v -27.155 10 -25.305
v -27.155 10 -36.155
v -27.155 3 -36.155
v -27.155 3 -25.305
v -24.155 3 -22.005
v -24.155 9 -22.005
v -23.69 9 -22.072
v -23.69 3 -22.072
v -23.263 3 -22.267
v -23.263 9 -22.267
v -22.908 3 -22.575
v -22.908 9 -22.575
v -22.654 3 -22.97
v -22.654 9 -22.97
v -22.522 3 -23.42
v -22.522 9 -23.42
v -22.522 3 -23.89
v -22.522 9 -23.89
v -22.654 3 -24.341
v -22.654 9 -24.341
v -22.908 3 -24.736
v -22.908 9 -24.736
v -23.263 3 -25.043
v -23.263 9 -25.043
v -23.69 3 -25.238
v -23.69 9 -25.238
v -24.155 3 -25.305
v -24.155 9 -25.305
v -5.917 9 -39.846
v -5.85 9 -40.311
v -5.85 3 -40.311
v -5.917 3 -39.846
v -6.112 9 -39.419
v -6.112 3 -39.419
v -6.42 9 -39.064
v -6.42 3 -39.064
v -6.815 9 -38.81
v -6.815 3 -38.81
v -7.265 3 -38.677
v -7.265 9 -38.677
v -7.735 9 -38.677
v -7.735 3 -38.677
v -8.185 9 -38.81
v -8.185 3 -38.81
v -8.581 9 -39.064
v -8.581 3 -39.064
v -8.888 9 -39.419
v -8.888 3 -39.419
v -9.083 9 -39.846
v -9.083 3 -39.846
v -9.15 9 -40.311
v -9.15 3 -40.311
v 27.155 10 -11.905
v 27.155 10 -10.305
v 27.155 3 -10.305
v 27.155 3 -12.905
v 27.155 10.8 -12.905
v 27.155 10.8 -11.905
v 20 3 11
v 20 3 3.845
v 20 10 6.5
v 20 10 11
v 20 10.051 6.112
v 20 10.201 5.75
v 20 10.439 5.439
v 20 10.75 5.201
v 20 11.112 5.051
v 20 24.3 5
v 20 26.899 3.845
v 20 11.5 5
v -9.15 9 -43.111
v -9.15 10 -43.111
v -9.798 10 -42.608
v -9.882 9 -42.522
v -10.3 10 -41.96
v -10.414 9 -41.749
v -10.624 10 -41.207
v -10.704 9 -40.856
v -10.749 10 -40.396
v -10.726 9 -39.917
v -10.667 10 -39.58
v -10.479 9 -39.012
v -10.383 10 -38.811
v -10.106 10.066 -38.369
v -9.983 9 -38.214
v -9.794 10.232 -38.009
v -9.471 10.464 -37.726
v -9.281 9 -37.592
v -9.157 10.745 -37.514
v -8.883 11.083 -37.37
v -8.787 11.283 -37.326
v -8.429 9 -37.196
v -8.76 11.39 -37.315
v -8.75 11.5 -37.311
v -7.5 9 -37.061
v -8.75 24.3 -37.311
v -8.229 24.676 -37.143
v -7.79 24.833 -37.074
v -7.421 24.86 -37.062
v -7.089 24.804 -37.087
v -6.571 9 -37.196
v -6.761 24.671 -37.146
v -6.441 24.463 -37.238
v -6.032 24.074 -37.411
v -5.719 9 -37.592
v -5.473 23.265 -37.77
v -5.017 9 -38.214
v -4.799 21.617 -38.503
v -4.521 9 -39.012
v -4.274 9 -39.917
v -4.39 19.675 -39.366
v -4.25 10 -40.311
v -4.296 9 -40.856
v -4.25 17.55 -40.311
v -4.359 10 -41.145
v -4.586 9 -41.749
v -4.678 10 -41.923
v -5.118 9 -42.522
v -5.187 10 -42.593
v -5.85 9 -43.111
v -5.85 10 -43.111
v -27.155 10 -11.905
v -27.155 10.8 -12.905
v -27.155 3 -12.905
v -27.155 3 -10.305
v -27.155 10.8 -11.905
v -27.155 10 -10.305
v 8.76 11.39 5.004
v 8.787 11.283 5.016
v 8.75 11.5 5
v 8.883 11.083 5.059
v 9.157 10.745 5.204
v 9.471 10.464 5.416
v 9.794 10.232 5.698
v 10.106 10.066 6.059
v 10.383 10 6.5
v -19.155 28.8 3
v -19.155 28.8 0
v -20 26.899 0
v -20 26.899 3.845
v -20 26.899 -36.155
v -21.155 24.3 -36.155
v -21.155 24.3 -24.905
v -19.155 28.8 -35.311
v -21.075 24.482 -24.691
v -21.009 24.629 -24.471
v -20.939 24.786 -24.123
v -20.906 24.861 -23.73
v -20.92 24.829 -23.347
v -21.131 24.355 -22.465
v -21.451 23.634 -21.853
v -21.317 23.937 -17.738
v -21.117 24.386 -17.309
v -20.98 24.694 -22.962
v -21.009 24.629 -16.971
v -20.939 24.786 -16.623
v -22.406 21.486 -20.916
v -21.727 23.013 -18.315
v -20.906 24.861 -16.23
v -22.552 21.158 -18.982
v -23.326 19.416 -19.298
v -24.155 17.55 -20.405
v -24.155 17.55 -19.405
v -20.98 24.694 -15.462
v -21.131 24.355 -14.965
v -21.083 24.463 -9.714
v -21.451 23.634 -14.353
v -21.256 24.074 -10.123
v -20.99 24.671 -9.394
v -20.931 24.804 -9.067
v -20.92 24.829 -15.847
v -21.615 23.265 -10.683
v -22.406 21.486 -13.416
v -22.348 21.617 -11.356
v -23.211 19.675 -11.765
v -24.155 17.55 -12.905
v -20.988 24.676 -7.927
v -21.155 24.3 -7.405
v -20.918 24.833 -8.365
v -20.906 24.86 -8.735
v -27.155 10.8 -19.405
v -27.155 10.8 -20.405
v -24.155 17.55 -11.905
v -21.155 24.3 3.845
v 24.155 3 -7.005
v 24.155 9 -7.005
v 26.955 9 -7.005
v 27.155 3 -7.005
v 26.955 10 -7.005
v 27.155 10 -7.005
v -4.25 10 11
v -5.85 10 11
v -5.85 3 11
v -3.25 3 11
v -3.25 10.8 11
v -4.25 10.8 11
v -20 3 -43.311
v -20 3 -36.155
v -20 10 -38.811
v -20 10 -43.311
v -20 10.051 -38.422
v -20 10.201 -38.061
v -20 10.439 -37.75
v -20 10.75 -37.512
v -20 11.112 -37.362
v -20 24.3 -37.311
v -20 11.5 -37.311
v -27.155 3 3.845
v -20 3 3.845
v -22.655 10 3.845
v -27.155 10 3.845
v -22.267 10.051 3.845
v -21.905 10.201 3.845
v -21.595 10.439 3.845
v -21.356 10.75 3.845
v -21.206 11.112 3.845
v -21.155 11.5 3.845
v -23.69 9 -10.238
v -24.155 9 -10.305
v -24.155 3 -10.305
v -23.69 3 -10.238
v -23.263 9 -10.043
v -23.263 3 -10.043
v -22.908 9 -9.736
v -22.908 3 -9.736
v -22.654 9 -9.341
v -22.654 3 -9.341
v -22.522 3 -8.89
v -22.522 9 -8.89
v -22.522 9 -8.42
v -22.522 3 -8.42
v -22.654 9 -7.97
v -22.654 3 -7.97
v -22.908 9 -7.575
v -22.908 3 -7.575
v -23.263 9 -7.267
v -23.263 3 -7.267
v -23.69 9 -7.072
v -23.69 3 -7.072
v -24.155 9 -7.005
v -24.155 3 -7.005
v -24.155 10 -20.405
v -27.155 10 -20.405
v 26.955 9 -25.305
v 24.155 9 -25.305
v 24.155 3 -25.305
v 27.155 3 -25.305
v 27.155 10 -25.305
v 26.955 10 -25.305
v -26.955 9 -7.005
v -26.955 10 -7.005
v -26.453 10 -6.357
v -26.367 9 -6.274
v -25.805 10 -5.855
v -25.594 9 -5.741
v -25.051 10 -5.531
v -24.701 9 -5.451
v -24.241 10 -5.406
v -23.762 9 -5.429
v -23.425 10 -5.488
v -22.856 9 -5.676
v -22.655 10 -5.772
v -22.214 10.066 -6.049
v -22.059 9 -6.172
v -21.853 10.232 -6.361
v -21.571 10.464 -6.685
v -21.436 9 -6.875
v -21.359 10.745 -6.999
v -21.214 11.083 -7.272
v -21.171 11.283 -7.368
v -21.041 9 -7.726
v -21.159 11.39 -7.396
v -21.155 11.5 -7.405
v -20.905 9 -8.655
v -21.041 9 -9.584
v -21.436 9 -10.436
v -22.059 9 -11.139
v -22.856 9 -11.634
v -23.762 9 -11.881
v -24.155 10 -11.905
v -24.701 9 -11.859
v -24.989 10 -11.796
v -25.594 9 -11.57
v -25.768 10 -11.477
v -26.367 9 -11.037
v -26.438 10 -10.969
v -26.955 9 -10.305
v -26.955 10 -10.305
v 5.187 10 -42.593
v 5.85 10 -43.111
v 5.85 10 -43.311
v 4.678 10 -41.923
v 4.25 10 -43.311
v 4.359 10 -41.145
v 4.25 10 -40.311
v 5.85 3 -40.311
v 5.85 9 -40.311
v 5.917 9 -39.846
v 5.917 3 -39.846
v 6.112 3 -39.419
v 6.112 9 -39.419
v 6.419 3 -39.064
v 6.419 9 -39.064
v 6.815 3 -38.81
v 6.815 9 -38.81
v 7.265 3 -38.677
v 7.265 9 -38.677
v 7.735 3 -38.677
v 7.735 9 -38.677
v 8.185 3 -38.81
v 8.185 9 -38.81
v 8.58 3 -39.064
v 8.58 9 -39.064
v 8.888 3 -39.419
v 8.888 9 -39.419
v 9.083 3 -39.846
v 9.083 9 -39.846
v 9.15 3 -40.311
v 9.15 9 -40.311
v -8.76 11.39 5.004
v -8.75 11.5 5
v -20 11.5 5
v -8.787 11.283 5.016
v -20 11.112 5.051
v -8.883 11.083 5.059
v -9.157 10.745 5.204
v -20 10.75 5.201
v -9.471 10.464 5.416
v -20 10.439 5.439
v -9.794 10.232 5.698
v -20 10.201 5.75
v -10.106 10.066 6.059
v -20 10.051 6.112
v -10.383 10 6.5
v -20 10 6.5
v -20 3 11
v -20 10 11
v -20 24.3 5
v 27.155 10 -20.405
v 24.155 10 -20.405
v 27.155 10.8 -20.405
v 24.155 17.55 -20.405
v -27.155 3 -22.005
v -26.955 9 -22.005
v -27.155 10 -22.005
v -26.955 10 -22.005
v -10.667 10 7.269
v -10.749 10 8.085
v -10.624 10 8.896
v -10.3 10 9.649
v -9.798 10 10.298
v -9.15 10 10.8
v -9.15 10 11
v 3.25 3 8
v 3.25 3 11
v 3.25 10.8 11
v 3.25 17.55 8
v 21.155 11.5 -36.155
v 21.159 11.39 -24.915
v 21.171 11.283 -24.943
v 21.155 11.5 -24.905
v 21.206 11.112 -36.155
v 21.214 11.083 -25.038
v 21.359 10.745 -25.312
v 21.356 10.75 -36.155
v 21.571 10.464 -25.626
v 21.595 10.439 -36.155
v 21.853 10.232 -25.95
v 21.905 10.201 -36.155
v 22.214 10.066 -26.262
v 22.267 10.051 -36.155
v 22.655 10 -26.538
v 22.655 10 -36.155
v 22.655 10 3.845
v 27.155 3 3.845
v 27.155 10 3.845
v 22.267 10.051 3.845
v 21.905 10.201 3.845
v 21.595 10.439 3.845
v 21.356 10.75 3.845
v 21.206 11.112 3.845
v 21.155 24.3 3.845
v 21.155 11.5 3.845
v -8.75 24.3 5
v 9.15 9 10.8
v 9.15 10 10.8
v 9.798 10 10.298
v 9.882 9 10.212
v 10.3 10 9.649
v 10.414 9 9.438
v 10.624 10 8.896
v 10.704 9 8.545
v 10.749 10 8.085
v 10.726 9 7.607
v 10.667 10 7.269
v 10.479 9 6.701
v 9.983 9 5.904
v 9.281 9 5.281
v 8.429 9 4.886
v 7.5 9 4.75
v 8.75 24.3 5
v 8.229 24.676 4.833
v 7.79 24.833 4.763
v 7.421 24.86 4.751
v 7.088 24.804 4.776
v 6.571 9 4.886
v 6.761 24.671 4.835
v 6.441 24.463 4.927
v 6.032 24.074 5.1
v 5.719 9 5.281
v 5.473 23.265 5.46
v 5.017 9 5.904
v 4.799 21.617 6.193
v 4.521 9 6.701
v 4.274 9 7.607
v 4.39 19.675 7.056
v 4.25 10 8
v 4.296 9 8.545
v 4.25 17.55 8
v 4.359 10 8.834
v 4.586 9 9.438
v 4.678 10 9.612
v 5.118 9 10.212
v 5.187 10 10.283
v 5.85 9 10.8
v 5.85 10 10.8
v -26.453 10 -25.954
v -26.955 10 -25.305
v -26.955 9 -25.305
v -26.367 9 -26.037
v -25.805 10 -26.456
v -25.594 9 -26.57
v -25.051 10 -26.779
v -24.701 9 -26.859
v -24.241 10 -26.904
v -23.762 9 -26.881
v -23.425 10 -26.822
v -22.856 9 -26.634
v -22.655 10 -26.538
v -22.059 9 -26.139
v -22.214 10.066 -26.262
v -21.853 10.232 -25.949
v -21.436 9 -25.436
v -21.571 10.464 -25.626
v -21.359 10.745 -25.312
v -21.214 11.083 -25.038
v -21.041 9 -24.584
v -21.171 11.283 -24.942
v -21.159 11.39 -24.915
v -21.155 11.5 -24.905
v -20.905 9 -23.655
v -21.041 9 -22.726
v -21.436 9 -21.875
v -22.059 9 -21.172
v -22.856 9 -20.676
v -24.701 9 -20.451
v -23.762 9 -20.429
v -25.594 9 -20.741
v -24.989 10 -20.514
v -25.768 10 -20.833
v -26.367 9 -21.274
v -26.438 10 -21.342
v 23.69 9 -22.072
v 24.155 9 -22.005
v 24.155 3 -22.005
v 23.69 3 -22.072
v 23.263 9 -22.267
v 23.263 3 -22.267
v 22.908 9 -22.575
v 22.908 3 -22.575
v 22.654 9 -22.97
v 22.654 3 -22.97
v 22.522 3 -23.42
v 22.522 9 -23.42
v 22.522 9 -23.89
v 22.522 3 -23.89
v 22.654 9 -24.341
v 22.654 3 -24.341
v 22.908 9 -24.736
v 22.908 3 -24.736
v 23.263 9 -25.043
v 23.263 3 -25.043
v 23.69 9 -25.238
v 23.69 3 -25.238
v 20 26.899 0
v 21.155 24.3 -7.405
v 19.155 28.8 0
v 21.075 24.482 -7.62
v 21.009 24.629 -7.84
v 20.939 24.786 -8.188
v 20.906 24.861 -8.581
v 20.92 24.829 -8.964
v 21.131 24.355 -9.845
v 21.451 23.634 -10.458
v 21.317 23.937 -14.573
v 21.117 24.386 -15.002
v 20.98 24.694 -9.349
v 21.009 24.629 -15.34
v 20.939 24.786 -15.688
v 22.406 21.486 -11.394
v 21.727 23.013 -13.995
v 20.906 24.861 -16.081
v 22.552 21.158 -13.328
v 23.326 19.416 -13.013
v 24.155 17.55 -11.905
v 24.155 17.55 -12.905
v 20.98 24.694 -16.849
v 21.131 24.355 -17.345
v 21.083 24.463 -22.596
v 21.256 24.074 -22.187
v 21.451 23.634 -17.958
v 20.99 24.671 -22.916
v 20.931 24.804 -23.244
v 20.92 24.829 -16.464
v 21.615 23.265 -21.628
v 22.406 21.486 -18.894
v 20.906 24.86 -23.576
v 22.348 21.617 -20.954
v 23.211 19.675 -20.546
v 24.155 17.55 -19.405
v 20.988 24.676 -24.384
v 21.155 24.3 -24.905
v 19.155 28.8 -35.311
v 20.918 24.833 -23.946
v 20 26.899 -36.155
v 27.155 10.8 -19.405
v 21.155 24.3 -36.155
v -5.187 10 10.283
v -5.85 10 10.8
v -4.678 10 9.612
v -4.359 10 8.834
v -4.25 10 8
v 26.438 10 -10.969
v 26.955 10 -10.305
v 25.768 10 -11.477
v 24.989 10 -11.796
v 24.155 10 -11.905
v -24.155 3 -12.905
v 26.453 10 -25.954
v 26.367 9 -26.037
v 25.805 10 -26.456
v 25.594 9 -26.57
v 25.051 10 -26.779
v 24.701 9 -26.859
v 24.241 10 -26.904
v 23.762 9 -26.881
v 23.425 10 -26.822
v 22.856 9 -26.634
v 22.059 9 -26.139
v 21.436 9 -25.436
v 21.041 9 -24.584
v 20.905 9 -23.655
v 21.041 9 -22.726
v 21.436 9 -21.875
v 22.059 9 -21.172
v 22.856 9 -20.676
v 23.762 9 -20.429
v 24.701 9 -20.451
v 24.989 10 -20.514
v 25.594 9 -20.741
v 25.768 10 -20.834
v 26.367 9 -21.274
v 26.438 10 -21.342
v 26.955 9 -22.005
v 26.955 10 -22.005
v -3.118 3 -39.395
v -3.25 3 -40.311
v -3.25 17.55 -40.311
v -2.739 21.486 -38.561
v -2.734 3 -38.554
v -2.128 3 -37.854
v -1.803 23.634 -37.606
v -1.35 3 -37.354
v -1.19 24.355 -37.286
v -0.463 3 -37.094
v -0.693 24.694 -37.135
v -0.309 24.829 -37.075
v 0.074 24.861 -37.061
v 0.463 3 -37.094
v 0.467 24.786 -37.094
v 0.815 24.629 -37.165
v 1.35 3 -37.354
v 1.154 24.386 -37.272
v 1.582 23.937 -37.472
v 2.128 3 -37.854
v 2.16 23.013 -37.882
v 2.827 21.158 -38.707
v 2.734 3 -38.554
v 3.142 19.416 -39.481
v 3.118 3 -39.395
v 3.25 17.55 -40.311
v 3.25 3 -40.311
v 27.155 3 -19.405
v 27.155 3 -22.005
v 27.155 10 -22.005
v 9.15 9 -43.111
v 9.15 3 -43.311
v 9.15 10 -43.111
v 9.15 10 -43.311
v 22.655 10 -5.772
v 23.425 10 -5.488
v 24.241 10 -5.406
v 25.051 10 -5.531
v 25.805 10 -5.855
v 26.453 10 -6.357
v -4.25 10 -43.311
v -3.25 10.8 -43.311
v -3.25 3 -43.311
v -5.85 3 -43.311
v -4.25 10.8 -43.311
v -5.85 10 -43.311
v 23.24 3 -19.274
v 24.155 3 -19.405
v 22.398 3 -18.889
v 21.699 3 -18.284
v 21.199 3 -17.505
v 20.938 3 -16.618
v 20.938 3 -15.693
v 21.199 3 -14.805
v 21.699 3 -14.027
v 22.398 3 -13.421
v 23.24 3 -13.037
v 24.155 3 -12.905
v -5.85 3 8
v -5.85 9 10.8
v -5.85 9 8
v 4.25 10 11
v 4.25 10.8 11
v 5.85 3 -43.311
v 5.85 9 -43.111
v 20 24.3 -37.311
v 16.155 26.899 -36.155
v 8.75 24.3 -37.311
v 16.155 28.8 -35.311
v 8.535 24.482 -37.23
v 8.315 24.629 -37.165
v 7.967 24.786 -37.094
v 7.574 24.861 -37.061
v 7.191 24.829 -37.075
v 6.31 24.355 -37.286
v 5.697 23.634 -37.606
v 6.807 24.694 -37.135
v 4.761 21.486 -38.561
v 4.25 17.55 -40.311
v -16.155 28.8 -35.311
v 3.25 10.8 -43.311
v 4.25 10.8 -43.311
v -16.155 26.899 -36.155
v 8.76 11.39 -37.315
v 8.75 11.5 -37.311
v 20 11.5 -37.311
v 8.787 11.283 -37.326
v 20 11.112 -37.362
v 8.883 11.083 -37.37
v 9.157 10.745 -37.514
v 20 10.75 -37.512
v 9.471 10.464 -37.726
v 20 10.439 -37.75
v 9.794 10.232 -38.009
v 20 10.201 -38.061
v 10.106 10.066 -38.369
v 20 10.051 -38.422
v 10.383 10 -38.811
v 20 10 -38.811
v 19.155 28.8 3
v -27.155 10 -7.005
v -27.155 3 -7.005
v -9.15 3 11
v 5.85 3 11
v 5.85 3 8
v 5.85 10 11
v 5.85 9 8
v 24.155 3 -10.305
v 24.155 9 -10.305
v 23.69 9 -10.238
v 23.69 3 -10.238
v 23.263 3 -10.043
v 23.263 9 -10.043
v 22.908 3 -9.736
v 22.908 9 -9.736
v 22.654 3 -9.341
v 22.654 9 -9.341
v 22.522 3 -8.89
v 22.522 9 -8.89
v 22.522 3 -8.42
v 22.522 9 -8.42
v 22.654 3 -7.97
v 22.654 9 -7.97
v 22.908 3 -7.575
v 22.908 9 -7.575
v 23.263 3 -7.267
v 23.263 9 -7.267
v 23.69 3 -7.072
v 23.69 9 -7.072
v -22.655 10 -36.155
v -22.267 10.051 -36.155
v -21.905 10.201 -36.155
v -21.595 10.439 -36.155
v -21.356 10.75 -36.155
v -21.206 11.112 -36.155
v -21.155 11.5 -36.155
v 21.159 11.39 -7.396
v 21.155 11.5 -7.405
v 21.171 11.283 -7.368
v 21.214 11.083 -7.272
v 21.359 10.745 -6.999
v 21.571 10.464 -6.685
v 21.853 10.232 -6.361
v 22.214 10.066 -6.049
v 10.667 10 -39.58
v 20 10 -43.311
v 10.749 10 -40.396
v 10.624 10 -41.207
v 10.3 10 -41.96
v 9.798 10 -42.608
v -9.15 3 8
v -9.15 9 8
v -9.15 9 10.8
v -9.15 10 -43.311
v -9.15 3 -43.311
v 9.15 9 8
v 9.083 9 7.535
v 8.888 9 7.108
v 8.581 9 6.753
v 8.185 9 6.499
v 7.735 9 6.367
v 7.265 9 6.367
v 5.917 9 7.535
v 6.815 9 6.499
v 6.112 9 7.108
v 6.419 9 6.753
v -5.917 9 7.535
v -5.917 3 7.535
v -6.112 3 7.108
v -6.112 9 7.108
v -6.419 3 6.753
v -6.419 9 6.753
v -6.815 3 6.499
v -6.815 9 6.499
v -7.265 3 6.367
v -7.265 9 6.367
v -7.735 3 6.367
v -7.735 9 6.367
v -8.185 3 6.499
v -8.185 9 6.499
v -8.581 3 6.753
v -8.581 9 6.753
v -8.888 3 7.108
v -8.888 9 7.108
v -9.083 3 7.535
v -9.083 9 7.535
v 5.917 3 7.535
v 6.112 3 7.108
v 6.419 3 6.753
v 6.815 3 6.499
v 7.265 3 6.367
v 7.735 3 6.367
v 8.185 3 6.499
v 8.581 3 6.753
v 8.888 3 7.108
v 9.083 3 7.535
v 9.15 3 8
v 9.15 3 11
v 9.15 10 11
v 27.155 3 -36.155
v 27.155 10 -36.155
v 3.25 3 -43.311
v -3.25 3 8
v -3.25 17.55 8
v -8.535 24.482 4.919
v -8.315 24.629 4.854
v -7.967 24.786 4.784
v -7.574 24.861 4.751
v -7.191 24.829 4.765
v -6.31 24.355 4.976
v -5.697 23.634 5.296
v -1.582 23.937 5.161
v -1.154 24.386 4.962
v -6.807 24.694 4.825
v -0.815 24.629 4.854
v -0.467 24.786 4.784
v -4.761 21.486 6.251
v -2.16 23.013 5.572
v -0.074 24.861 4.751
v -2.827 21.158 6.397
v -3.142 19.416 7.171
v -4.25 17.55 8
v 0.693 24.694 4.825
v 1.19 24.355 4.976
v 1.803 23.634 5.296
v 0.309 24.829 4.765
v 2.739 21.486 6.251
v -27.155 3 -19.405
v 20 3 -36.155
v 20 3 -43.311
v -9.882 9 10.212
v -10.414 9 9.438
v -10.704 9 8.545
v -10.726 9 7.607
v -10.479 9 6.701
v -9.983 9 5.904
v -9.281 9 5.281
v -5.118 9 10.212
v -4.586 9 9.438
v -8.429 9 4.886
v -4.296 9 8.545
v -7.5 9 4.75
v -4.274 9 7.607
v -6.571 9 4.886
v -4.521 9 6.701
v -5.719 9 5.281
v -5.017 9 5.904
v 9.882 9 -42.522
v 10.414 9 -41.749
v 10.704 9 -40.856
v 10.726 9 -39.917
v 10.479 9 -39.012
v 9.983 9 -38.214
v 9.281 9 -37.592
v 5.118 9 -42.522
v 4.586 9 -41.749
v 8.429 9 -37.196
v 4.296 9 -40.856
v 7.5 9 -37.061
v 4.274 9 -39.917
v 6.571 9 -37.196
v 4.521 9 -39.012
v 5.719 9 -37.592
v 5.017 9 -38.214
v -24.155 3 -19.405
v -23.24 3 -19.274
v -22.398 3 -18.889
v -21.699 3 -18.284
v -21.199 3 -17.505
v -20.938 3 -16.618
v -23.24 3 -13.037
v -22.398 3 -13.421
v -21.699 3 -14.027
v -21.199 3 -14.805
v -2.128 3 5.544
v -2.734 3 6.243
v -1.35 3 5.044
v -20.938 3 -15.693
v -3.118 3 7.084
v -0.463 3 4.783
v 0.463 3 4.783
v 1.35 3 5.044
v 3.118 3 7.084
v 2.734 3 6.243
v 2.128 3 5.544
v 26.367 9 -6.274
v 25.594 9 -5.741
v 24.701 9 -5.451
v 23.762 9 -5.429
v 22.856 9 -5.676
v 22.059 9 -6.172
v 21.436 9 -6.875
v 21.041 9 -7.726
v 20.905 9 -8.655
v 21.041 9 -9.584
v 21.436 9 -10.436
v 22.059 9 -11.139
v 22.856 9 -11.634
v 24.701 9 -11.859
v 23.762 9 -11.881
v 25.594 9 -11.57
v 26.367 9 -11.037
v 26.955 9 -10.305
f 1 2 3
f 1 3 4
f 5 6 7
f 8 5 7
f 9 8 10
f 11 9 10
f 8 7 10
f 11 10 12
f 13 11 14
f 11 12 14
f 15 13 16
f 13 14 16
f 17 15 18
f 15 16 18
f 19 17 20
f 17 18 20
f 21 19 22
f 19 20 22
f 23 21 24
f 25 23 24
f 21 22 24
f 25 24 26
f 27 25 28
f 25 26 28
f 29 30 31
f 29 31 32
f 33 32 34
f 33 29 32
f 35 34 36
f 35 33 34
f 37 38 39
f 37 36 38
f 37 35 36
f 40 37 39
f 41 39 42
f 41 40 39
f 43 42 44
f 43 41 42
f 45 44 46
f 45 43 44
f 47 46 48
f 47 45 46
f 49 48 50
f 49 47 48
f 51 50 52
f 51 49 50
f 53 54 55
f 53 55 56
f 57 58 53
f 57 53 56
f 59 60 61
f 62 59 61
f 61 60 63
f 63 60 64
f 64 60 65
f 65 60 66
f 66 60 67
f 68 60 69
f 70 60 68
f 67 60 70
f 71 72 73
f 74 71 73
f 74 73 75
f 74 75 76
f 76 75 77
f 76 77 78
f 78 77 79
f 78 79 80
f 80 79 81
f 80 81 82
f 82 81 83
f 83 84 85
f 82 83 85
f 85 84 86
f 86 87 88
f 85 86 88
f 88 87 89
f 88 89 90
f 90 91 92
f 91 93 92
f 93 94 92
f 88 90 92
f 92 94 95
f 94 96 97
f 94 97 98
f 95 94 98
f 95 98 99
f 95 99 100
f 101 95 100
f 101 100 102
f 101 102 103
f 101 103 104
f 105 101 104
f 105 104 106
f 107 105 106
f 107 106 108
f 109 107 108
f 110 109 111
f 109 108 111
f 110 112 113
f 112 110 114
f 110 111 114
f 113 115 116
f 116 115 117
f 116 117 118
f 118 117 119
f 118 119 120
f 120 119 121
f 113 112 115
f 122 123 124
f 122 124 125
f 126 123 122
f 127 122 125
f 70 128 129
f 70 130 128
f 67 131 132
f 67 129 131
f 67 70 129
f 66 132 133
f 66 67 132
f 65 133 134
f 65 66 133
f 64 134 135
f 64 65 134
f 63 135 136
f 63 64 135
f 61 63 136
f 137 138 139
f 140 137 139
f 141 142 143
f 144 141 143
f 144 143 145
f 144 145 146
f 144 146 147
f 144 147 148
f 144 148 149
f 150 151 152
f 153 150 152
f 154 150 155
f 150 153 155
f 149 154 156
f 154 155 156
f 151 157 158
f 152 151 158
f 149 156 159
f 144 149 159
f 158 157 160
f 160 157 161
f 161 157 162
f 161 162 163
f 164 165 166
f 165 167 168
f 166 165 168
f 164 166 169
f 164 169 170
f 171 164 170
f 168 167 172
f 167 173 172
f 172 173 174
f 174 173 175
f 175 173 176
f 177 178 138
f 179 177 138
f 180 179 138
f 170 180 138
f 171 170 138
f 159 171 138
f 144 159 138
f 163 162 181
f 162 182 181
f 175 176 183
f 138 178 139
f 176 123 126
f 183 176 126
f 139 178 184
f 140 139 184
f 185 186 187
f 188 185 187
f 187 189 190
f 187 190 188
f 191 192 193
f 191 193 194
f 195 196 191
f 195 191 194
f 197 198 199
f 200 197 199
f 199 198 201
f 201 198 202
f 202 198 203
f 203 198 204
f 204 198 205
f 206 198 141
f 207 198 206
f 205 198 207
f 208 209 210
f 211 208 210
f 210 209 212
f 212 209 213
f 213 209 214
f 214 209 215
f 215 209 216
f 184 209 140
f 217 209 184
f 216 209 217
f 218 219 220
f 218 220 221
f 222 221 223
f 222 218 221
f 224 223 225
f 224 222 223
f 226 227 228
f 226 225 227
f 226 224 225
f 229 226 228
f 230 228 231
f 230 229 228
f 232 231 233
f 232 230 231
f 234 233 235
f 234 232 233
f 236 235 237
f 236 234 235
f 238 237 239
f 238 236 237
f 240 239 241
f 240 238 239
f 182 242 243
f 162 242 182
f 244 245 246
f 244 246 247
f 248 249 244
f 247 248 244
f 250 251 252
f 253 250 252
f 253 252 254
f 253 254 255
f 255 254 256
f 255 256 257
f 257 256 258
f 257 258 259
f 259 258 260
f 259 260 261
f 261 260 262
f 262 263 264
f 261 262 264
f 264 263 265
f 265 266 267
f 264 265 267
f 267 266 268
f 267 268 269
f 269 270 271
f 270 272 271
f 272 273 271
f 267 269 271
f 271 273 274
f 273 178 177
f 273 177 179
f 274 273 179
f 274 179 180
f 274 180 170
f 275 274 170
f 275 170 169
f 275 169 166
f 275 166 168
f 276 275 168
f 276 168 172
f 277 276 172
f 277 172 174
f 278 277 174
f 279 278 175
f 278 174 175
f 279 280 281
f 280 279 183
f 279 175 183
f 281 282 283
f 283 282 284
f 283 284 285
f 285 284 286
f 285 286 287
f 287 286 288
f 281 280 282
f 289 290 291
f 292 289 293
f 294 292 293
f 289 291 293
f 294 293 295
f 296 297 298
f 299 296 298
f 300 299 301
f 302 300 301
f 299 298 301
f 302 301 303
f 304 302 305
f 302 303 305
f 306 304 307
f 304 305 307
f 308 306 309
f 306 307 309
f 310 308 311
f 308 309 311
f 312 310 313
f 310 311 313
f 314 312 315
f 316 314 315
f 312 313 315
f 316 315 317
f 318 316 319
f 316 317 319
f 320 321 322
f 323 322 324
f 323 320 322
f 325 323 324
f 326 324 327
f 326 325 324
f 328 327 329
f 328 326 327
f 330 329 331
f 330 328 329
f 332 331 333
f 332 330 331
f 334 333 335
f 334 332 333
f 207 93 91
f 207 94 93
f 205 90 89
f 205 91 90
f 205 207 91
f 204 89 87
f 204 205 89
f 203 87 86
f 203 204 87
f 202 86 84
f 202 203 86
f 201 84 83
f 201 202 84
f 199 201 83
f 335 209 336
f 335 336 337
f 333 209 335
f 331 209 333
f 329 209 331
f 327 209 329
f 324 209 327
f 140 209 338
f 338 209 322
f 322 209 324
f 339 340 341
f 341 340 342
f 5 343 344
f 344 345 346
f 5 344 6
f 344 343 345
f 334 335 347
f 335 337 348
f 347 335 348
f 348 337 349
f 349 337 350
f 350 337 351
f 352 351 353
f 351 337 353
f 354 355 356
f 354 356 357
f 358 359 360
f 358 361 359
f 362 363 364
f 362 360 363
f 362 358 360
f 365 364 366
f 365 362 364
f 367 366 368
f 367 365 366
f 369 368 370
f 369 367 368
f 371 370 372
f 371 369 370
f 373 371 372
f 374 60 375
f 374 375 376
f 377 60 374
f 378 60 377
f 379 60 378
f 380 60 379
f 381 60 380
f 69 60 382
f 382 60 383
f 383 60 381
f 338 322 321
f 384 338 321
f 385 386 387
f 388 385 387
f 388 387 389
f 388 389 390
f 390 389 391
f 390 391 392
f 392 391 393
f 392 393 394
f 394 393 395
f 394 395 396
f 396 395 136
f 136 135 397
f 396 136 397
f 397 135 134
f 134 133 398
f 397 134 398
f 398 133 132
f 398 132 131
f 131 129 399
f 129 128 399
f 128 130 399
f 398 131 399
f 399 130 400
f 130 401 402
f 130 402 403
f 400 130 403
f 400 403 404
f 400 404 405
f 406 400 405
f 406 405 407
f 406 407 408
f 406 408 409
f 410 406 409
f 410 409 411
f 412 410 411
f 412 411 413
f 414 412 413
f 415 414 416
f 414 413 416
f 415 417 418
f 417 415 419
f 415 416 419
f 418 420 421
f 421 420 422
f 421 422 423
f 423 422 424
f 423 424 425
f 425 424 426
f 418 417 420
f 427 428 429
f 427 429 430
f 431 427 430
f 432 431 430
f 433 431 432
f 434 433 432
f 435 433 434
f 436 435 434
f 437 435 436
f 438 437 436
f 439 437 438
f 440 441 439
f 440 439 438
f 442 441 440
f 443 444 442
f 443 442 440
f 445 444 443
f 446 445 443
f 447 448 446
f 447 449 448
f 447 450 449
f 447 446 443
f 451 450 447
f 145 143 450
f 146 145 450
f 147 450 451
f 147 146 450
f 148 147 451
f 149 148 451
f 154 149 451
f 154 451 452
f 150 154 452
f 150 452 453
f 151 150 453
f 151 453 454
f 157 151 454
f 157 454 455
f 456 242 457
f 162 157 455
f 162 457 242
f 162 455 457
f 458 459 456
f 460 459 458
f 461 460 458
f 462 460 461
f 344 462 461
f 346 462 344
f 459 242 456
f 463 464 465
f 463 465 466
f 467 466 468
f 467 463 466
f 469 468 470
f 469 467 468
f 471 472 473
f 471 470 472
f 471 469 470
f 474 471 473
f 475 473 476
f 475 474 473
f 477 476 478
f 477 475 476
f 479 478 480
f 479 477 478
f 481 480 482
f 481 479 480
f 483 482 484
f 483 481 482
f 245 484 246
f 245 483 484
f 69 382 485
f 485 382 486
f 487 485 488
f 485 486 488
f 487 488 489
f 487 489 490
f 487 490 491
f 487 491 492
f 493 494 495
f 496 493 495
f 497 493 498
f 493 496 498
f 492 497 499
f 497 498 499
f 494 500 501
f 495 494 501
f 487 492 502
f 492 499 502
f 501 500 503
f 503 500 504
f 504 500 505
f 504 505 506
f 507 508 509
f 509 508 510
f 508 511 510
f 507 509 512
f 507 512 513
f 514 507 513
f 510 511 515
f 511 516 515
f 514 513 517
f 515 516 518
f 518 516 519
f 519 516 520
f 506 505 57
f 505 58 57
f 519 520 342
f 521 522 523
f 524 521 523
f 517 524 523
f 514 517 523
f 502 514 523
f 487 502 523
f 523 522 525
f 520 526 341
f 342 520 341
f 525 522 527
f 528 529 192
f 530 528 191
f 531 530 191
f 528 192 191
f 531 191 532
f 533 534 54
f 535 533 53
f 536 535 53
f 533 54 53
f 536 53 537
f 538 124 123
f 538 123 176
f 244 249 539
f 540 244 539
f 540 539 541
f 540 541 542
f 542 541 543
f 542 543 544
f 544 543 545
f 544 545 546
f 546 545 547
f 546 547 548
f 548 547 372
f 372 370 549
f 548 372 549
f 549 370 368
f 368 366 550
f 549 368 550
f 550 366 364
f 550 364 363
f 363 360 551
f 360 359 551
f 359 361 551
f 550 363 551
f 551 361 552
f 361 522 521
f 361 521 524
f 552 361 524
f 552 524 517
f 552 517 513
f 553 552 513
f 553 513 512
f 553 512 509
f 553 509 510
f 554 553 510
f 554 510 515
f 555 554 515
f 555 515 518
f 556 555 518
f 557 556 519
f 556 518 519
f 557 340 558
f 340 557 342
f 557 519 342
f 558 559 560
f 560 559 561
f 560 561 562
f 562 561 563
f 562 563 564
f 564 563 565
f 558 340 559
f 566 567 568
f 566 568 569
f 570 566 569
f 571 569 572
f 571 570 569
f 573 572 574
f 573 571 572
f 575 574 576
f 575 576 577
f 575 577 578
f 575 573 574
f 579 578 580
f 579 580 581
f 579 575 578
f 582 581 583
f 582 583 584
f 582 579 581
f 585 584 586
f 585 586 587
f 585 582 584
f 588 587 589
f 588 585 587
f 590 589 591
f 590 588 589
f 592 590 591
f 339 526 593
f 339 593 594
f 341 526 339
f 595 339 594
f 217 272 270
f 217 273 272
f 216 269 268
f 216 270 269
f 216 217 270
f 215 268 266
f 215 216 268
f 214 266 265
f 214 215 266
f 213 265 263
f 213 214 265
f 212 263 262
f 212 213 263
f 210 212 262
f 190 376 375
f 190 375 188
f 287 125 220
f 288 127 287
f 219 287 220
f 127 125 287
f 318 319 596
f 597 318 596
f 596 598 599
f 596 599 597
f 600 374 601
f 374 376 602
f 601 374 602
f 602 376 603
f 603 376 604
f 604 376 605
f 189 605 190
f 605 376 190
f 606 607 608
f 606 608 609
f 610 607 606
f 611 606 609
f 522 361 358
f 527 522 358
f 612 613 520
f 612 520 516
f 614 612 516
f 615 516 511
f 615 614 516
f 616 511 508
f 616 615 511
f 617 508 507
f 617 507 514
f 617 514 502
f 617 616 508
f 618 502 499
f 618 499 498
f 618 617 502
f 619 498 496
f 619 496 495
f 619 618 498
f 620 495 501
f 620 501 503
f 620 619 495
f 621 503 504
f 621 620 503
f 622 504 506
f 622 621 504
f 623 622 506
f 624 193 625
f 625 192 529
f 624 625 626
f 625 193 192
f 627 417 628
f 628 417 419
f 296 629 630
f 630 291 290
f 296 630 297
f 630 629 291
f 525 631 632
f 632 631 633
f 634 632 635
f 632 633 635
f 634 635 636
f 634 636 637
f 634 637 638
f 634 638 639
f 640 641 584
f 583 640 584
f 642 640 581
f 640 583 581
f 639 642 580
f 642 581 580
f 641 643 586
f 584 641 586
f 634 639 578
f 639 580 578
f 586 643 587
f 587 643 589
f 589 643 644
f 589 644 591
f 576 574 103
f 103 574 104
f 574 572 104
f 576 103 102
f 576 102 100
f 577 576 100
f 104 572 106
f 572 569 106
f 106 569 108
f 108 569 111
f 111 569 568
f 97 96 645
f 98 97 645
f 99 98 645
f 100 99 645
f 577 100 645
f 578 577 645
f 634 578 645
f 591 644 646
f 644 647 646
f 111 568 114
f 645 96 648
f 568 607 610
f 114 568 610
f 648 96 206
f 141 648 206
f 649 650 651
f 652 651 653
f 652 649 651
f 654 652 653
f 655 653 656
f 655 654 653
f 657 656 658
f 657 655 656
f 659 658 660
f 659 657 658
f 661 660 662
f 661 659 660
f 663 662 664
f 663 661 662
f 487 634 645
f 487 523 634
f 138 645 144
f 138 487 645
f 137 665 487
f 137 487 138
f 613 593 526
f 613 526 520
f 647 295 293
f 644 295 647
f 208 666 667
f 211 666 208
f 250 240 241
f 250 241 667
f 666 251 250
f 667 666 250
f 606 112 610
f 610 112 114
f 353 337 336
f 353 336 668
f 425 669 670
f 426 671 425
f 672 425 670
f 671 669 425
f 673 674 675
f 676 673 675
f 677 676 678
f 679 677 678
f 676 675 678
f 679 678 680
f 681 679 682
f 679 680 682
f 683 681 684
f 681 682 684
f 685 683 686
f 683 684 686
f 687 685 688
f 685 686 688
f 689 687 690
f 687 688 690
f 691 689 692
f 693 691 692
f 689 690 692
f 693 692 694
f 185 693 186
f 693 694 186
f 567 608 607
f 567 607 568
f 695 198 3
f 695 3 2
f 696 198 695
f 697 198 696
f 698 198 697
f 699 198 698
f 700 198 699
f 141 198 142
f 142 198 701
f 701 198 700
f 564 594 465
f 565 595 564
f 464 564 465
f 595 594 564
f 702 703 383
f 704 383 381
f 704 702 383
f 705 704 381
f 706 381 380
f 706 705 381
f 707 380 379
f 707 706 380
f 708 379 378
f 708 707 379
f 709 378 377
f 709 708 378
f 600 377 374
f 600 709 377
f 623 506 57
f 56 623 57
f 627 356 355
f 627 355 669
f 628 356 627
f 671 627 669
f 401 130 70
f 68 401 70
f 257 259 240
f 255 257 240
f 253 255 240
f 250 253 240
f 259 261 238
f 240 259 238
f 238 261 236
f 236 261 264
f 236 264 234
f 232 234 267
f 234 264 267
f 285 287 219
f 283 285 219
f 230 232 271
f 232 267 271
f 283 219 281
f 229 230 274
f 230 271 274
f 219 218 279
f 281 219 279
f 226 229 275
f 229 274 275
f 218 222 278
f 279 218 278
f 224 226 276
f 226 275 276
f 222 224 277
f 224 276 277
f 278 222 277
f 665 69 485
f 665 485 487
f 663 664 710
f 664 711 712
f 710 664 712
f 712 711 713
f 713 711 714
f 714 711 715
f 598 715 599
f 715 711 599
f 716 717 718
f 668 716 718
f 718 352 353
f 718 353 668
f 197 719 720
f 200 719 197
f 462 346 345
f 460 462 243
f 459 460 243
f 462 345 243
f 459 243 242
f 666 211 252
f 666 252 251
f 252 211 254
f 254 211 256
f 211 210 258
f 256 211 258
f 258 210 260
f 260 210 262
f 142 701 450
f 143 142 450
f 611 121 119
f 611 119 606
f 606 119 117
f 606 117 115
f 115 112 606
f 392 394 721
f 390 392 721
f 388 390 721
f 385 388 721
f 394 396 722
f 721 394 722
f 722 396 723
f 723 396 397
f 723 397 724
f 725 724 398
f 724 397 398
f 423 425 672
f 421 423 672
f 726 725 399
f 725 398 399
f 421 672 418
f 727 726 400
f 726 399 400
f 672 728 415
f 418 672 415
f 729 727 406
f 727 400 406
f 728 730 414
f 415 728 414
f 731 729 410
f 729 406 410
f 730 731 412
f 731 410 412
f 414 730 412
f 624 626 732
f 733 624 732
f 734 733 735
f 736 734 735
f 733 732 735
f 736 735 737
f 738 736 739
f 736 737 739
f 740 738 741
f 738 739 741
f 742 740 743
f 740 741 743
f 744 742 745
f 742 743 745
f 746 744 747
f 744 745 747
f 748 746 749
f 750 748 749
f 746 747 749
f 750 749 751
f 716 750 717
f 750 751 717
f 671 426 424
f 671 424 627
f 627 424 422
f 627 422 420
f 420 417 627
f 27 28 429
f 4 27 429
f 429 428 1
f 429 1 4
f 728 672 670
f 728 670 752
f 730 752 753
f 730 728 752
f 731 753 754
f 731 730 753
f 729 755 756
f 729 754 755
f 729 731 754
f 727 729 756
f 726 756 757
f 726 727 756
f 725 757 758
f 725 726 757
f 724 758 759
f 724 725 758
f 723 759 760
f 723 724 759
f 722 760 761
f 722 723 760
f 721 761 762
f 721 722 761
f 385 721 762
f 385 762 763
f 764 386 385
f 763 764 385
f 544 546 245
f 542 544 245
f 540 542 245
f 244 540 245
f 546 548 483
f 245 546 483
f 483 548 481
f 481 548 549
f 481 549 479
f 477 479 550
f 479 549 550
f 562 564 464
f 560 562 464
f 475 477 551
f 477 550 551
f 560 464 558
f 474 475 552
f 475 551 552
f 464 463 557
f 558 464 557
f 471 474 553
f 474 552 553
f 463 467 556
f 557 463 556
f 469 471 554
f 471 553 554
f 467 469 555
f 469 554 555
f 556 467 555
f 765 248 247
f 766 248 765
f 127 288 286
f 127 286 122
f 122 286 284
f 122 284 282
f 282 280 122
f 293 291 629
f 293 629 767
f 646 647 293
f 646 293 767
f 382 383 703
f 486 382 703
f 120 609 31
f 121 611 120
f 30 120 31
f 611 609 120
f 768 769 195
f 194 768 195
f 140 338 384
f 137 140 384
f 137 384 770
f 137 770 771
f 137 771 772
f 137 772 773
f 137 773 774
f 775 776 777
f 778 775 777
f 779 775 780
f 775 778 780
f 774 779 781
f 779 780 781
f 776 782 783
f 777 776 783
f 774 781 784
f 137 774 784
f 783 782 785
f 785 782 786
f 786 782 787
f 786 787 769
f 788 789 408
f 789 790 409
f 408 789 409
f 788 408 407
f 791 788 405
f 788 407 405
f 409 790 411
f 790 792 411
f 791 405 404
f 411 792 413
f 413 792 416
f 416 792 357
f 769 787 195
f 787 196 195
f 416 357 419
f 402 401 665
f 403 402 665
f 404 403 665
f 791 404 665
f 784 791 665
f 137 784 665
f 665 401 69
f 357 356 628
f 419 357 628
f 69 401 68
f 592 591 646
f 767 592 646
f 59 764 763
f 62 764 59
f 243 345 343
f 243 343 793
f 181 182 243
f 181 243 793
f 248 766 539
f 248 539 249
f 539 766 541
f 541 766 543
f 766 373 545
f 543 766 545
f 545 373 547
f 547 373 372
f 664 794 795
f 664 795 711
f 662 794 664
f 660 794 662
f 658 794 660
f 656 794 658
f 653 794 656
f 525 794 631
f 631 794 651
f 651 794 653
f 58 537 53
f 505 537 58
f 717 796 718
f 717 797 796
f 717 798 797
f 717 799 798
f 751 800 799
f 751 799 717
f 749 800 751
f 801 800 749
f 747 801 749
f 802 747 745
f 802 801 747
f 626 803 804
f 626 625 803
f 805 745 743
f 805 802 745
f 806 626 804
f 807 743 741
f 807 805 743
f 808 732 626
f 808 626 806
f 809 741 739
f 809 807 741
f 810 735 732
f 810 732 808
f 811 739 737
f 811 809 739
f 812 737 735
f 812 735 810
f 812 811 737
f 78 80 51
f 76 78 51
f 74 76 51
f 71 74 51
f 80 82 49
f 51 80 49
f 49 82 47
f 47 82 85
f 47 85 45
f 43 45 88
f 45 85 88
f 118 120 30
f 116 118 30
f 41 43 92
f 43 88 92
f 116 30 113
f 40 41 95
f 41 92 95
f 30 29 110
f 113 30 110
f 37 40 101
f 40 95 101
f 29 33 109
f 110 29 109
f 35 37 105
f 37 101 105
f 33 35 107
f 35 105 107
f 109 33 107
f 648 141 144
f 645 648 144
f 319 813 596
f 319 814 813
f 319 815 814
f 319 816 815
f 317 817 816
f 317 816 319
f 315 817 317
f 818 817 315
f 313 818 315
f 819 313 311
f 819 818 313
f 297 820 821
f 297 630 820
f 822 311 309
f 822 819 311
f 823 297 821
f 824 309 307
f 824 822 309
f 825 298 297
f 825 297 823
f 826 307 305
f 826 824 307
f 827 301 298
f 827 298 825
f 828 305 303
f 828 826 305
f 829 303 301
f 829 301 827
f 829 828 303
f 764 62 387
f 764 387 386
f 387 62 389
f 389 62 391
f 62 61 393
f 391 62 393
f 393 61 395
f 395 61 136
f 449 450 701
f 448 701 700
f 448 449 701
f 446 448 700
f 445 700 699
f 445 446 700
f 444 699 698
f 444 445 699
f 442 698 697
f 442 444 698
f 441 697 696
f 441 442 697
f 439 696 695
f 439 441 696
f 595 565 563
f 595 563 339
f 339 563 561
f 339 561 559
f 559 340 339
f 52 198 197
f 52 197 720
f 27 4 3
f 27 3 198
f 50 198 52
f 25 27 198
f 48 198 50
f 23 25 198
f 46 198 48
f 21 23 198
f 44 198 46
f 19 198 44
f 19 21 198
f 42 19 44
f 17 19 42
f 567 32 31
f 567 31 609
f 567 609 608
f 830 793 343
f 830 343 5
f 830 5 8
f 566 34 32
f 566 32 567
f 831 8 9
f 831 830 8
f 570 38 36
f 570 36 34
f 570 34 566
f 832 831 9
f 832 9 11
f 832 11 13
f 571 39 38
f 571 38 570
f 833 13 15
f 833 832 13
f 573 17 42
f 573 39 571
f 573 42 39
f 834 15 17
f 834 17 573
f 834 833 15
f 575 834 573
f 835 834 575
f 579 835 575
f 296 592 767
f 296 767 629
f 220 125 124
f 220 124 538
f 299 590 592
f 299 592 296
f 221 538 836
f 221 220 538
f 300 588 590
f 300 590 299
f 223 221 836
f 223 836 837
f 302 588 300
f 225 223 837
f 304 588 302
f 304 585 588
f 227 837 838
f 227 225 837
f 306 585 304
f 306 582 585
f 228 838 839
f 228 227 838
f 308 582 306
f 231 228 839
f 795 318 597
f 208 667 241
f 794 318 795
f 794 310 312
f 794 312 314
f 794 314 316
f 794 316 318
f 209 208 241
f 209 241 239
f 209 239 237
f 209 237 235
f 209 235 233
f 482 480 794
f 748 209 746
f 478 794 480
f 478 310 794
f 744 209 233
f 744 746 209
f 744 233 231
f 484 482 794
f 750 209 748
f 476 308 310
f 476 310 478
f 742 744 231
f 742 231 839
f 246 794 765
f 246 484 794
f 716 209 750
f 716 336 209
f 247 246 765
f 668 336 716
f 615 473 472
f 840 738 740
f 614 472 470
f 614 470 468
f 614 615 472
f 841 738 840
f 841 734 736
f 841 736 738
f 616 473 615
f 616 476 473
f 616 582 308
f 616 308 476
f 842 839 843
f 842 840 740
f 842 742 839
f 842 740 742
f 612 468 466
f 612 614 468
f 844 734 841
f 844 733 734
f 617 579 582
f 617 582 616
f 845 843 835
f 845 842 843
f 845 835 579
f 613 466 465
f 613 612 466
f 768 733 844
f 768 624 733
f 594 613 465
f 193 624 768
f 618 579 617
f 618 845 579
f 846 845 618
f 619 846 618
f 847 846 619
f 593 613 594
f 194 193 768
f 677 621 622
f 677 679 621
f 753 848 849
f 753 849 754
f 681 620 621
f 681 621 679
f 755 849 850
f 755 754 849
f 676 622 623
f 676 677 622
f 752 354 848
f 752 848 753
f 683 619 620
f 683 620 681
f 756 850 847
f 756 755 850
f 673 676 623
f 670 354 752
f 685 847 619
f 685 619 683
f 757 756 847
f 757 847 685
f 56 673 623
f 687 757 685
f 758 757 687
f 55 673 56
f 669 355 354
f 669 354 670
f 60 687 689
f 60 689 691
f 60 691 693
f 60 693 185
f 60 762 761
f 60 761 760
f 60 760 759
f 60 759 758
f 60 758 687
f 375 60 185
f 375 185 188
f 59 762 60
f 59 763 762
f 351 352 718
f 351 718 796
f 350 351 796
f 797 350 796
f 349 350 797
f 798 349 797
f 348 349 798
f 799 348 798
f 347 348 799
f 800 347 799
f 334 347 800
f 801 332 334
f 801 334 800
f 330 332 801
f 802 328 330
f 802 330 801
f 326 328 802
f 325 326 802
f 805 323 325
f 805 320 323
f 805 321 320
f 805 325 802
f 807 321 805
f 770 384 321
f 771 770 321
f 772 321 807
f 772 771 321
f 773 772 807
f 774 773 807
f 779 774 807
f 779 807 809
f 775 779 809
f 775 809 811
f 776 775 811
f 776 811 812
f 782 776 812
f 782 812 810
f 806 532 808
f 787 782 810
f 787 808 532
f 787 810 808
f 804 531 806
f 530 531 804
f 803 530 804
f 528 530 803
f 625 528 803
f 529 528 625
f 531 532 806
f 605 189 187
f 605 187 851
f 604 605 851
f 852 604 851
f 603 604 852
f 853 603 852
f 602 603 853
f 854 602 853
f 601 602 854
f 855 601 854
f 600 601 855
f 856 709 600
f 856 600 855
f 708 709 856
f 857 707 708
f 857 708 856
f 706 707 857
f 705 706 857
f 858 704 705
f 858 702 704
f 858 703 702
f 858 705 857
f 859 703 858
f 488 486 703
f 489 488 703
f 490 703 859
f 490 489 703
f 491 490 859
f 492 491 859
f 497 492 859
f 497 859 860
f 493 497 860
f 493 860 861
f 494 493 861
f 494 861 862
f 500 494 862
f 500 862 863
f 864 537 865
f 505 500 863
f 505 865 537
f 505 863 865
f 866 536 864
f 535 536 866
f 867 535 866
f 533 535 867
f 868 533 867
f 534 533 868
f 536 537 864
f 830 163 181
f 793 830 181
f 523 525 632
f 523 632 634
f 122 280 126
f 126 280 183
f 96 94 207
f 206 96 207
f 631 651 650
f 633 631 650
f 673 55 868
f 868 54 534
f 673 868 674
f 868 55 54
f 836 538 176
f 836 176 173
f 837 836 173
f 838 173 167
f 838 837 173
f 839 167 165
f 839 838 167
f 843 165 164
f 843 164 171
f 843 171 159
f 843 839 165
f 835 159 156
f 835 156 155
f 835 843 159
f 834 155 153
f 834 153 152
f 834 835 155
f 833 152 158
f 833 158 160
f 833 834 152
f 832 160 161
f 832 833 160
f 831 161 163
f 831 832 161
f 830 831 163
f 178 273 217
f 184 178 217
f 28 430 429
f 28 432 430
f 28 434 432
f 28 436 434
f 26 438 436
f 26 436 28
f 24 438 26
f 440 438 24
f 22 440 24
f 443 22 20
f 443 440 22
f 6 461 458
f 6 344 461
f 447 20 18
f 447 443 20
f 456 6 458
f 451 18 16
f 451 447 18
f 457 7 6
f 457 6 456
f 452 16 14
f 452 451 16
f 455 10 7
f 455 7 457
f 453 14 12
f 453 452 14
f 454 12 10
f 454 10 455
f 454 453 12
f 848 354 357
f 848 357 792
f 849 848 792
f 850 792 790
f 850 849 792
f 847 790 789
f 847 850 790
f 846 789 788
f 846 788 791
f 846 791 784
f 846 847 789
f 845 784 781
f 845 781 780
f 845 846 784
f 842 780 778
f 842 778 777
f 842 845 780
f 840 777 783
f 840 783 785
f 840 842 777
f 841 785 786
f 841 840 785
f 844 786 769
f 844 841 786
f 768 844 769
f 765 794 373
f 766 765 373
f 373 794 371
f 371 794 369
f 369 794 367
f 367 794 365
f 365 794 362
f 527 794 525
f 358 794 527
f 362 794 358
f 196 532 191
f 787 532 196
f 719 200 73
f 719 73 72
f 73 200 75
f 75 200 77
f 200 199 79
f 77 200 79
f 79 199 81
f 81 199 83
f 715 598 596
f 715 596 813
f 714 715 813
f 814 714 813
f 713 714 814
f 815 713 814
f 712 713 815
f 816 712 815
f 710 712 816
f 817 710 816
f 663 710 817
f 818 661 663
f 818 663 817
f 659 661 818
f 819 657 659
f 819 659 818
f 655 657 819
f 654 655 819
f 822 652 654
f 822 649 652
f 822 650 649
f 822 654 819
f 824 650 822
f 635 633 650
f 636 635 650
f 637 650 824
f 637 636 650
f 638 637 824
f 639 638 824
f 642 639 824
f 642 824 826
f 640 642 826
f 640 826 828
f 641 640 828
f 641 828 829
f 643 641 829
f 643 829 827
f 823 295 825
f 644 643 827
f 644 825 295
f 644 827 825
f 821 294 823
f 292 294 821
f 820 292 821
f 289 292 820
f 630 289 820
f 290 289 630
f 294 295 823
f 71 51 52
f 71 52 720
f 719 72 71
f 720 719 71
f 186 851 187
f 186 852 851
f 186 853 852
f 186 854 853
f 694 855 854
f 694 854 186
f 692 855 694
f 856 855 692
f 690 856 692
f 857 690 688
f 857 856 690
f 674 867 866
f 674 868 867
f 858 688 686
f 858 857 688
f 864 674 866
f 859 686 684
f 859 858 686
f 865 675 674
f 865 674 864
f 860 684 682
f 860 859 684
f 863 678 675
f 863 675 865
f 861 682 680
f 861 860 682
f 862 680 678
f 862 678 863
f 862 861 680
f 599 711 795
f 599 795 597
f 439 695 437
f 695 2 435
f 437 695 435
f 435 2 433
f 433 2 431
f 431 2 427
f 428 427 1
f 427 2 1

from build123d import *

# Parameters (mm, degrees)
SKETCH1_W            = 40
SKETCH1_H            = 28.8
BOSS_EXTRUDE1_DEPTH  = 11
CHAMFER2_SIZE        = 8
CHAMFER2_SIZE2       = 18
SKETCH10_W           = 13.5
SKETCH10_H           = 18.8
CUT_EXTRUDE7_DEPTH   = 6
FILLET1_R            = 1.5
SKETCH11_W           = 40
SKETCH11_H           = 3
CUT_EXTRUDE8_DEPTH   = 8
CUT_EXTRUDE9_REACH   = 38.748
CUT_EXTRUDE10_DEPTH  = 30.57093174
CUT_EXTRUDE2_DEPTH   = 30
SKETCH15_R           = 3.25
CUT_EXTRUDE12_DEPTH  = 1
CRVPATTERN15_ANGLE   = 90
CRVPATTERN15_2_ANGLE = 90
CRVPATTERN15_3_ANGLE = 180
CUT_EXTRUDE17_DEPTH  = 71.205905928
CUT_EXTRUDE18_DEPTH  = 62.566827448
CUT_EXTRUDE19_DEPTH  = 62.566810271
CUT_EXTRUDE20_DEPTH  = 71.20590591
SKETCH32_W           = 149.475413632
SKETCH32_H           = 198.109954942
CUT_EXTRUDE21_DEPTH  = 3
SKETCH34_W           = 32.310599212
SKETCH34_H           = 32.310599212
BOSS_EXTRUDE4_DEPTH  = 25.8


with BuildPart() as part:
    # Sketch1 → Boss-Extrude1 (new body)
    with BuildSketch(Plane.XY):
        with Locations((0, 14.4)):
            Rectangle(SKETCH1_W, SKETCH1_H)
    extrude(amount=BOSS_EXTRUDE1_DEPTH)

    # Chamfer2
    chamfer2_edges = [part.edges().sort_by_distance(p)[0] for p in [
        (0, 28.8, 11),
    ]]
    chamfer2_side = [part.faces().sort_by_distance(p)[0] for p in [
        (0, 28.8, 5.5),
    ]]
    chamfer(chamfer2_edges, length=CHAMFER2_SIZE, length2=CHAMFER2_SIZE2, reference=chamfer2_side[0])

    # Sketch10 → Cut-Extrude7 (cut)
    with BuildSketch(Plane.XY.offset(11)):
        with Locations((-13.25, 19.4)):
            Rectangle(SKETCH10_W, SKETCH10_H)
        with Locations((13.25, 19.4)):
            Rectangle(SKETCH10_W, SKETCH10_H)
    extrude(amount=-CUT_EXTRUDE7_DEPTH, mode=Mode.SUBTRACT)

    # Fillet1
    fillet1_edges = [part.edges().sort_by_distance(p)[0] for p in [
        (-13.25, 10, 5),
        (13.25, 10, 5),
    ]]
    fillet(fillet1_edges, radius=FILLET1_R)

    # Sketch11 → Cut-Extrude8 (cut)
    with BuildSketch(Plane.XY.offset(11)):
        with Locations((0, 1.5)):
            Rectangle(SKETCH11_W, SKETCH11_H)
    extrude(amount=-CUT_EXTRUDE8_DEPTH, mode=Mode.SUBTRACT)

    # Cut-Extrude9: up to this face of the body (flat: up to its plane)
    cut_extrude9_end = Plane(part.part.faces().sort_by_distance((-13.25, 10, 8.75))[0])
    # Sketch12 → Cut-Extrude9 (cut, up to the picked face)
    with BuildSketch(Plane(origin=(0, 28.8, 0), x_dir=(1, 0, 0), z_dir=(0, 1, 0)), mode=Mode.PRIVATE) as cut_extrude9_sk1:
        with BuildLine():
            Line((-4.25, -8), (-4.25, -11))
            Line((-4.25, -11), (-10.75, -11))
            Line((-10.75, -11), (-10.75, -8))
            ThreePointArc((-10.75, -8), (-7.5, -4.75), (-4.25, -8))
        make_face()
    cut_extrude9_tool1 = split(extrude(cut_extrude9_sk1.sketch, amount=-CUT_EXTRUDE9_REACH, mode=Mode.PRIVATE), bisect_by=cut_extrude9_end, keep=Keep.BOTH, mode=Mode.PRIVATE)
    cut_extrude9 = cut_extrude9_tool1.solids().sort_by(Axis((-7.5, 28.8, 8.176346), (0, -1, 0)))[0]
    add(cut_extrude9, mode=Mode.SUBTRACT)

    # Sketch13 → Cut-Extrude10 (cut, through all)
    with BuildSketch(Plane(origin=(0, 10, 0), x_dir=(1, 0, 0), z_dir=(0, 1, 0))):
        with BuildLine():
            Line((-9.15, -8), (-9.15, -11))
            Line((-9.15, -11), (-5.85, -11))
            Line((-5.85, -11), (-5.85, -8))
            ThreePointArc((-5.85, -8), (-7.5, -6.35), (-9.15, -8))
        make_face()
    cut_extrude10 = extrude(amount=-CUT_EXTRUDE10_DEPTH, mode=Mode.SUBTRACT)

    # Sketch3 → Cut-Extrude2 (cut)
    with BuildSketch(Plane.XZ):
        with BuildLine():
            Line((-3.25, 8), (-3.25, 11))
            Line((-3.25, 11), (3.25, 11))
            Line((3.25, 11), (3.25, 8))
            ThreePointArc((3.25, 8), (0, 4.75), (-3.25, 8))
        make_face()
    extrude(amount=-CUT_EXTRUDE2_DEPTH, mode=Mode.SUBTRACT)

    # Sketch15 → Cut-Extrude12 (cut)
    with BuildSketch(Plane(origin=(0, 10, 0), x_dir=(1, 0, 0), z_dir=(0, 1, 0))):
        with Locations((-7.5, -8)):
            Circle(SKETCH15_R)
    cut_extrude12 = extrude(amount=-CUT_EXTRUDE12_DEPTH, mode=Mode.SUBTRACT)

    # Mirror1: Cut-Extrude9, Cut-Extrude10, Cut-Extrude12 across plane
    add(cut_extrude9.mirror(Plane(origin=(0, 0, 0), x_dir=(0, 0, 1), z_dir=(1, 0, 0))), mode=Mode.SUBTRACT)
    add(cut_extrude10.mirror(Plane(origin=(0, 0, 0), x_dir=(0, 0, 1), z_dir=(1, 0, 0))), mode=Mode.SUBTRACT)
    add(cut_extrude12.mirror(Plane(origin=(0, 0, 0), x_dir=(0, 0, 1), z_dir=(1, 0, 0))), mode=Mode.SUBTRACT)


with BuildPart() as body_2:
    # CrvPattern15: read off the stored shape, not the designer's step
    # CrvPattern15: copy of part
    add(part.part.moved(Location((-16.1552884, 0, 16.1553108))).rotate(Axis((0, 0, 0), (0, -1, 0)), CRVPATTERN15_ANGLE))


with BuildPart() as body_3:
    # CrvPattern15 2: copy of part
    add(part.part.moved(Location((16.1553108, 0, 16.1552884))).rotate(Axis((0, 0, 0), (0, 1, 0)), CRVPATTERN15_2_ANGLE))


with BuildPart() as body_4:
    # CrvPattern15 3: copy of part
    add(part.part.moved(Location((2.24e-05, 0, 32.3105992))).rotate(Axis((0, 0, 0), (0, 1, 0)), CRVPATTERN15_3_ANGLE))


with BuildPart() as cut_extrude17_tool:
    # Sketch28 → Cut-Extrude17 (new, through all)
    with BuildSketch(Plane.ZY.offset(20)):
        Polygon((3, 28.8), (8.248381553, 50.710117836), (5, 24.3), align=None)
    extrude(amount=-CUT_EXTRUDE17_DEPTH)


with BuildPart() as body_2_1:
    add(body_2.part)

    # Cut-Extrude17: cut by cut_extrude17_tool
    add(cut_extrude17_tool.part, mode=Mode.SUBTRACT)


with BuildPart() as body_3_1:
    add(body_3.part)

    # Cut-Extrude17: cut by cut_extrude17_tool
    add(cut_extrude17_tool.part, mode=Mode.SUBTRACT)


with BuildPart() as cut_extrude18_tool:
    # Sketch29 → Cut-Extrude18 (new, through all)
    with BuildSketch(Plane.XY.offset(3.844711608)):
        Polygon((-20, 26.899449344), (-21.15531082, 24.3), (-24.025546184, 30.410559603), (-17.596499578, 32.307325294), align=None)
    extrude(amount=-CUT_EXTRUDE18_DEPTH)


with BuildPart() as part_1:
    add(part.part)

    # Cut-Extrude18: cut by cut_extrude18_tool
    add(cut_extrude18_tool.part, mode=Mode.SUBTRACT)


with BuildPart() as body_4_1:
    add(body_4.part)

    # Cut-Extrude18: cut by cut_extrude18_tool
    add(cut_extrude18_tool.part, mode=Mode.SUBTRACT)


with BuildPart() as cut_extrude19_tool:
    # Sketch30 → Cut-Extrude19 (new, through all)
    with BuildSketch(Plane.XY.offset(3.84468918)):
        Polygon((21.155288392, 24.3), (19.999977573, 26.899449344), (18.296515049, 30.732240022), (23.600824173, 33.089710744), align=None)
    extrude(amount=-CUT_EXTRUDE19_DEPTH)


with BuildPart() as part_2:
    add(part_1.part)

    # Cut-Extrude19: cut by cut_extrude19_tool
    add(cut_extrude19_tool.part, mode=Mode.SUBTRACT)


with BuildPart() as body_4_2:
    add(body_4_1.part)

    # Cut-Extrude19: cut by cut_extrude19_tool
    add(cut_extrude19_tool.part, mode=Mode.SUBTRACT)


with BuildPart() as cut_extrude20_tool:
    # Sketch31 → Cut-Extrude20 (new, through all)
    with BuildSketch(Plane(origin=(19.999977573, 0, 0), x_dir=(0, 0, -1), z_dir=(1, 0, 0))):
        Polygon((36.155288392, 26.899449344), (31.135560458, 38.193837197), (35.352724539, 40.068132344), (39.213228154, 31.381999209), align=None)
    extrude(amount=-CUT_EXTRUDE20_DEPTH)


with BuildPart() as body_2_2:
    add(body_2_1.part)

    # Cut-Extrude20: cut by cut_extrude20_tool
    add(cut_extrude20_tool.part, mode=Mode.SUBTRACT)


with BuildPart() as body_3_2:
    add(body_3_1.part)

    # Cut-Extrude20: cut by cut_extrude20_tool
    add(cut_extrude20_tool.part, mode=Mode.SUBTRACT)


with BuildPart() as cut_extrude21_tool:
    # Sketch32 → Cut-Extrude21 (new body)
    with BuildSketch(Plane.XZ.offset(-3)):
        with Locations((-20.69221841, -55.919702486)):
            Rectangle(SKETCH32_W, SKETCH32_H)
    extrude(amount=CUT_EXTRUDE21_DEPTH)


with BuildPart() as part_3:
    add(part_2.part)

    # Cut-Extrude21: cut by cut_extrude21_tool
    add(cut_extrude21_tool.part, mode=Mode.SUBTRACT)



with BuildPart() as body_2_3:
    add(body_2_2.part)

    # Cut-Extrude21: cut by cut_extrude21_tool
    add(cut_extrude21_tool.part, mode=Mode.SUBTRACT)


with BuildPart() as body_3_3:
    add(body_3_2.part)

    # Cut-Extrude21: cut by cut_extrude21_tool
    add(cut_extrude21_tool.part, mode=Mode.SUBTRACT)


with BuildPart() as body_4_3:
    add(body_4_2.part)

    # Cut-Extrude21: cut by cut_extrude21_tool
    add(cut_extrude21_tool.part, mode=Mode.SUBTRACT)


with BuildPart() as part_4:
    add(part_3.part)

    add(body_2_3.part)  # Boss-Extrude4 merges body 2

    add(body_3_3.part)  # Boss-Extrude4 merges body 3

    add(body_4_3.part)  # Boss-Extrude4 merges body 4
    # Sketch34 → Boss-Extrude4 (add)
    with BuildSketch(Plane.XZ.offset(-3)):
        with Locations((-1.1214e-05, -16.155299606)):
            Rectangle(SKETCH34_W, SKETCH34_H)
    extrude(amount=-BOSS_EXTRUDE4_DEPTH)


solid = part_4.part
